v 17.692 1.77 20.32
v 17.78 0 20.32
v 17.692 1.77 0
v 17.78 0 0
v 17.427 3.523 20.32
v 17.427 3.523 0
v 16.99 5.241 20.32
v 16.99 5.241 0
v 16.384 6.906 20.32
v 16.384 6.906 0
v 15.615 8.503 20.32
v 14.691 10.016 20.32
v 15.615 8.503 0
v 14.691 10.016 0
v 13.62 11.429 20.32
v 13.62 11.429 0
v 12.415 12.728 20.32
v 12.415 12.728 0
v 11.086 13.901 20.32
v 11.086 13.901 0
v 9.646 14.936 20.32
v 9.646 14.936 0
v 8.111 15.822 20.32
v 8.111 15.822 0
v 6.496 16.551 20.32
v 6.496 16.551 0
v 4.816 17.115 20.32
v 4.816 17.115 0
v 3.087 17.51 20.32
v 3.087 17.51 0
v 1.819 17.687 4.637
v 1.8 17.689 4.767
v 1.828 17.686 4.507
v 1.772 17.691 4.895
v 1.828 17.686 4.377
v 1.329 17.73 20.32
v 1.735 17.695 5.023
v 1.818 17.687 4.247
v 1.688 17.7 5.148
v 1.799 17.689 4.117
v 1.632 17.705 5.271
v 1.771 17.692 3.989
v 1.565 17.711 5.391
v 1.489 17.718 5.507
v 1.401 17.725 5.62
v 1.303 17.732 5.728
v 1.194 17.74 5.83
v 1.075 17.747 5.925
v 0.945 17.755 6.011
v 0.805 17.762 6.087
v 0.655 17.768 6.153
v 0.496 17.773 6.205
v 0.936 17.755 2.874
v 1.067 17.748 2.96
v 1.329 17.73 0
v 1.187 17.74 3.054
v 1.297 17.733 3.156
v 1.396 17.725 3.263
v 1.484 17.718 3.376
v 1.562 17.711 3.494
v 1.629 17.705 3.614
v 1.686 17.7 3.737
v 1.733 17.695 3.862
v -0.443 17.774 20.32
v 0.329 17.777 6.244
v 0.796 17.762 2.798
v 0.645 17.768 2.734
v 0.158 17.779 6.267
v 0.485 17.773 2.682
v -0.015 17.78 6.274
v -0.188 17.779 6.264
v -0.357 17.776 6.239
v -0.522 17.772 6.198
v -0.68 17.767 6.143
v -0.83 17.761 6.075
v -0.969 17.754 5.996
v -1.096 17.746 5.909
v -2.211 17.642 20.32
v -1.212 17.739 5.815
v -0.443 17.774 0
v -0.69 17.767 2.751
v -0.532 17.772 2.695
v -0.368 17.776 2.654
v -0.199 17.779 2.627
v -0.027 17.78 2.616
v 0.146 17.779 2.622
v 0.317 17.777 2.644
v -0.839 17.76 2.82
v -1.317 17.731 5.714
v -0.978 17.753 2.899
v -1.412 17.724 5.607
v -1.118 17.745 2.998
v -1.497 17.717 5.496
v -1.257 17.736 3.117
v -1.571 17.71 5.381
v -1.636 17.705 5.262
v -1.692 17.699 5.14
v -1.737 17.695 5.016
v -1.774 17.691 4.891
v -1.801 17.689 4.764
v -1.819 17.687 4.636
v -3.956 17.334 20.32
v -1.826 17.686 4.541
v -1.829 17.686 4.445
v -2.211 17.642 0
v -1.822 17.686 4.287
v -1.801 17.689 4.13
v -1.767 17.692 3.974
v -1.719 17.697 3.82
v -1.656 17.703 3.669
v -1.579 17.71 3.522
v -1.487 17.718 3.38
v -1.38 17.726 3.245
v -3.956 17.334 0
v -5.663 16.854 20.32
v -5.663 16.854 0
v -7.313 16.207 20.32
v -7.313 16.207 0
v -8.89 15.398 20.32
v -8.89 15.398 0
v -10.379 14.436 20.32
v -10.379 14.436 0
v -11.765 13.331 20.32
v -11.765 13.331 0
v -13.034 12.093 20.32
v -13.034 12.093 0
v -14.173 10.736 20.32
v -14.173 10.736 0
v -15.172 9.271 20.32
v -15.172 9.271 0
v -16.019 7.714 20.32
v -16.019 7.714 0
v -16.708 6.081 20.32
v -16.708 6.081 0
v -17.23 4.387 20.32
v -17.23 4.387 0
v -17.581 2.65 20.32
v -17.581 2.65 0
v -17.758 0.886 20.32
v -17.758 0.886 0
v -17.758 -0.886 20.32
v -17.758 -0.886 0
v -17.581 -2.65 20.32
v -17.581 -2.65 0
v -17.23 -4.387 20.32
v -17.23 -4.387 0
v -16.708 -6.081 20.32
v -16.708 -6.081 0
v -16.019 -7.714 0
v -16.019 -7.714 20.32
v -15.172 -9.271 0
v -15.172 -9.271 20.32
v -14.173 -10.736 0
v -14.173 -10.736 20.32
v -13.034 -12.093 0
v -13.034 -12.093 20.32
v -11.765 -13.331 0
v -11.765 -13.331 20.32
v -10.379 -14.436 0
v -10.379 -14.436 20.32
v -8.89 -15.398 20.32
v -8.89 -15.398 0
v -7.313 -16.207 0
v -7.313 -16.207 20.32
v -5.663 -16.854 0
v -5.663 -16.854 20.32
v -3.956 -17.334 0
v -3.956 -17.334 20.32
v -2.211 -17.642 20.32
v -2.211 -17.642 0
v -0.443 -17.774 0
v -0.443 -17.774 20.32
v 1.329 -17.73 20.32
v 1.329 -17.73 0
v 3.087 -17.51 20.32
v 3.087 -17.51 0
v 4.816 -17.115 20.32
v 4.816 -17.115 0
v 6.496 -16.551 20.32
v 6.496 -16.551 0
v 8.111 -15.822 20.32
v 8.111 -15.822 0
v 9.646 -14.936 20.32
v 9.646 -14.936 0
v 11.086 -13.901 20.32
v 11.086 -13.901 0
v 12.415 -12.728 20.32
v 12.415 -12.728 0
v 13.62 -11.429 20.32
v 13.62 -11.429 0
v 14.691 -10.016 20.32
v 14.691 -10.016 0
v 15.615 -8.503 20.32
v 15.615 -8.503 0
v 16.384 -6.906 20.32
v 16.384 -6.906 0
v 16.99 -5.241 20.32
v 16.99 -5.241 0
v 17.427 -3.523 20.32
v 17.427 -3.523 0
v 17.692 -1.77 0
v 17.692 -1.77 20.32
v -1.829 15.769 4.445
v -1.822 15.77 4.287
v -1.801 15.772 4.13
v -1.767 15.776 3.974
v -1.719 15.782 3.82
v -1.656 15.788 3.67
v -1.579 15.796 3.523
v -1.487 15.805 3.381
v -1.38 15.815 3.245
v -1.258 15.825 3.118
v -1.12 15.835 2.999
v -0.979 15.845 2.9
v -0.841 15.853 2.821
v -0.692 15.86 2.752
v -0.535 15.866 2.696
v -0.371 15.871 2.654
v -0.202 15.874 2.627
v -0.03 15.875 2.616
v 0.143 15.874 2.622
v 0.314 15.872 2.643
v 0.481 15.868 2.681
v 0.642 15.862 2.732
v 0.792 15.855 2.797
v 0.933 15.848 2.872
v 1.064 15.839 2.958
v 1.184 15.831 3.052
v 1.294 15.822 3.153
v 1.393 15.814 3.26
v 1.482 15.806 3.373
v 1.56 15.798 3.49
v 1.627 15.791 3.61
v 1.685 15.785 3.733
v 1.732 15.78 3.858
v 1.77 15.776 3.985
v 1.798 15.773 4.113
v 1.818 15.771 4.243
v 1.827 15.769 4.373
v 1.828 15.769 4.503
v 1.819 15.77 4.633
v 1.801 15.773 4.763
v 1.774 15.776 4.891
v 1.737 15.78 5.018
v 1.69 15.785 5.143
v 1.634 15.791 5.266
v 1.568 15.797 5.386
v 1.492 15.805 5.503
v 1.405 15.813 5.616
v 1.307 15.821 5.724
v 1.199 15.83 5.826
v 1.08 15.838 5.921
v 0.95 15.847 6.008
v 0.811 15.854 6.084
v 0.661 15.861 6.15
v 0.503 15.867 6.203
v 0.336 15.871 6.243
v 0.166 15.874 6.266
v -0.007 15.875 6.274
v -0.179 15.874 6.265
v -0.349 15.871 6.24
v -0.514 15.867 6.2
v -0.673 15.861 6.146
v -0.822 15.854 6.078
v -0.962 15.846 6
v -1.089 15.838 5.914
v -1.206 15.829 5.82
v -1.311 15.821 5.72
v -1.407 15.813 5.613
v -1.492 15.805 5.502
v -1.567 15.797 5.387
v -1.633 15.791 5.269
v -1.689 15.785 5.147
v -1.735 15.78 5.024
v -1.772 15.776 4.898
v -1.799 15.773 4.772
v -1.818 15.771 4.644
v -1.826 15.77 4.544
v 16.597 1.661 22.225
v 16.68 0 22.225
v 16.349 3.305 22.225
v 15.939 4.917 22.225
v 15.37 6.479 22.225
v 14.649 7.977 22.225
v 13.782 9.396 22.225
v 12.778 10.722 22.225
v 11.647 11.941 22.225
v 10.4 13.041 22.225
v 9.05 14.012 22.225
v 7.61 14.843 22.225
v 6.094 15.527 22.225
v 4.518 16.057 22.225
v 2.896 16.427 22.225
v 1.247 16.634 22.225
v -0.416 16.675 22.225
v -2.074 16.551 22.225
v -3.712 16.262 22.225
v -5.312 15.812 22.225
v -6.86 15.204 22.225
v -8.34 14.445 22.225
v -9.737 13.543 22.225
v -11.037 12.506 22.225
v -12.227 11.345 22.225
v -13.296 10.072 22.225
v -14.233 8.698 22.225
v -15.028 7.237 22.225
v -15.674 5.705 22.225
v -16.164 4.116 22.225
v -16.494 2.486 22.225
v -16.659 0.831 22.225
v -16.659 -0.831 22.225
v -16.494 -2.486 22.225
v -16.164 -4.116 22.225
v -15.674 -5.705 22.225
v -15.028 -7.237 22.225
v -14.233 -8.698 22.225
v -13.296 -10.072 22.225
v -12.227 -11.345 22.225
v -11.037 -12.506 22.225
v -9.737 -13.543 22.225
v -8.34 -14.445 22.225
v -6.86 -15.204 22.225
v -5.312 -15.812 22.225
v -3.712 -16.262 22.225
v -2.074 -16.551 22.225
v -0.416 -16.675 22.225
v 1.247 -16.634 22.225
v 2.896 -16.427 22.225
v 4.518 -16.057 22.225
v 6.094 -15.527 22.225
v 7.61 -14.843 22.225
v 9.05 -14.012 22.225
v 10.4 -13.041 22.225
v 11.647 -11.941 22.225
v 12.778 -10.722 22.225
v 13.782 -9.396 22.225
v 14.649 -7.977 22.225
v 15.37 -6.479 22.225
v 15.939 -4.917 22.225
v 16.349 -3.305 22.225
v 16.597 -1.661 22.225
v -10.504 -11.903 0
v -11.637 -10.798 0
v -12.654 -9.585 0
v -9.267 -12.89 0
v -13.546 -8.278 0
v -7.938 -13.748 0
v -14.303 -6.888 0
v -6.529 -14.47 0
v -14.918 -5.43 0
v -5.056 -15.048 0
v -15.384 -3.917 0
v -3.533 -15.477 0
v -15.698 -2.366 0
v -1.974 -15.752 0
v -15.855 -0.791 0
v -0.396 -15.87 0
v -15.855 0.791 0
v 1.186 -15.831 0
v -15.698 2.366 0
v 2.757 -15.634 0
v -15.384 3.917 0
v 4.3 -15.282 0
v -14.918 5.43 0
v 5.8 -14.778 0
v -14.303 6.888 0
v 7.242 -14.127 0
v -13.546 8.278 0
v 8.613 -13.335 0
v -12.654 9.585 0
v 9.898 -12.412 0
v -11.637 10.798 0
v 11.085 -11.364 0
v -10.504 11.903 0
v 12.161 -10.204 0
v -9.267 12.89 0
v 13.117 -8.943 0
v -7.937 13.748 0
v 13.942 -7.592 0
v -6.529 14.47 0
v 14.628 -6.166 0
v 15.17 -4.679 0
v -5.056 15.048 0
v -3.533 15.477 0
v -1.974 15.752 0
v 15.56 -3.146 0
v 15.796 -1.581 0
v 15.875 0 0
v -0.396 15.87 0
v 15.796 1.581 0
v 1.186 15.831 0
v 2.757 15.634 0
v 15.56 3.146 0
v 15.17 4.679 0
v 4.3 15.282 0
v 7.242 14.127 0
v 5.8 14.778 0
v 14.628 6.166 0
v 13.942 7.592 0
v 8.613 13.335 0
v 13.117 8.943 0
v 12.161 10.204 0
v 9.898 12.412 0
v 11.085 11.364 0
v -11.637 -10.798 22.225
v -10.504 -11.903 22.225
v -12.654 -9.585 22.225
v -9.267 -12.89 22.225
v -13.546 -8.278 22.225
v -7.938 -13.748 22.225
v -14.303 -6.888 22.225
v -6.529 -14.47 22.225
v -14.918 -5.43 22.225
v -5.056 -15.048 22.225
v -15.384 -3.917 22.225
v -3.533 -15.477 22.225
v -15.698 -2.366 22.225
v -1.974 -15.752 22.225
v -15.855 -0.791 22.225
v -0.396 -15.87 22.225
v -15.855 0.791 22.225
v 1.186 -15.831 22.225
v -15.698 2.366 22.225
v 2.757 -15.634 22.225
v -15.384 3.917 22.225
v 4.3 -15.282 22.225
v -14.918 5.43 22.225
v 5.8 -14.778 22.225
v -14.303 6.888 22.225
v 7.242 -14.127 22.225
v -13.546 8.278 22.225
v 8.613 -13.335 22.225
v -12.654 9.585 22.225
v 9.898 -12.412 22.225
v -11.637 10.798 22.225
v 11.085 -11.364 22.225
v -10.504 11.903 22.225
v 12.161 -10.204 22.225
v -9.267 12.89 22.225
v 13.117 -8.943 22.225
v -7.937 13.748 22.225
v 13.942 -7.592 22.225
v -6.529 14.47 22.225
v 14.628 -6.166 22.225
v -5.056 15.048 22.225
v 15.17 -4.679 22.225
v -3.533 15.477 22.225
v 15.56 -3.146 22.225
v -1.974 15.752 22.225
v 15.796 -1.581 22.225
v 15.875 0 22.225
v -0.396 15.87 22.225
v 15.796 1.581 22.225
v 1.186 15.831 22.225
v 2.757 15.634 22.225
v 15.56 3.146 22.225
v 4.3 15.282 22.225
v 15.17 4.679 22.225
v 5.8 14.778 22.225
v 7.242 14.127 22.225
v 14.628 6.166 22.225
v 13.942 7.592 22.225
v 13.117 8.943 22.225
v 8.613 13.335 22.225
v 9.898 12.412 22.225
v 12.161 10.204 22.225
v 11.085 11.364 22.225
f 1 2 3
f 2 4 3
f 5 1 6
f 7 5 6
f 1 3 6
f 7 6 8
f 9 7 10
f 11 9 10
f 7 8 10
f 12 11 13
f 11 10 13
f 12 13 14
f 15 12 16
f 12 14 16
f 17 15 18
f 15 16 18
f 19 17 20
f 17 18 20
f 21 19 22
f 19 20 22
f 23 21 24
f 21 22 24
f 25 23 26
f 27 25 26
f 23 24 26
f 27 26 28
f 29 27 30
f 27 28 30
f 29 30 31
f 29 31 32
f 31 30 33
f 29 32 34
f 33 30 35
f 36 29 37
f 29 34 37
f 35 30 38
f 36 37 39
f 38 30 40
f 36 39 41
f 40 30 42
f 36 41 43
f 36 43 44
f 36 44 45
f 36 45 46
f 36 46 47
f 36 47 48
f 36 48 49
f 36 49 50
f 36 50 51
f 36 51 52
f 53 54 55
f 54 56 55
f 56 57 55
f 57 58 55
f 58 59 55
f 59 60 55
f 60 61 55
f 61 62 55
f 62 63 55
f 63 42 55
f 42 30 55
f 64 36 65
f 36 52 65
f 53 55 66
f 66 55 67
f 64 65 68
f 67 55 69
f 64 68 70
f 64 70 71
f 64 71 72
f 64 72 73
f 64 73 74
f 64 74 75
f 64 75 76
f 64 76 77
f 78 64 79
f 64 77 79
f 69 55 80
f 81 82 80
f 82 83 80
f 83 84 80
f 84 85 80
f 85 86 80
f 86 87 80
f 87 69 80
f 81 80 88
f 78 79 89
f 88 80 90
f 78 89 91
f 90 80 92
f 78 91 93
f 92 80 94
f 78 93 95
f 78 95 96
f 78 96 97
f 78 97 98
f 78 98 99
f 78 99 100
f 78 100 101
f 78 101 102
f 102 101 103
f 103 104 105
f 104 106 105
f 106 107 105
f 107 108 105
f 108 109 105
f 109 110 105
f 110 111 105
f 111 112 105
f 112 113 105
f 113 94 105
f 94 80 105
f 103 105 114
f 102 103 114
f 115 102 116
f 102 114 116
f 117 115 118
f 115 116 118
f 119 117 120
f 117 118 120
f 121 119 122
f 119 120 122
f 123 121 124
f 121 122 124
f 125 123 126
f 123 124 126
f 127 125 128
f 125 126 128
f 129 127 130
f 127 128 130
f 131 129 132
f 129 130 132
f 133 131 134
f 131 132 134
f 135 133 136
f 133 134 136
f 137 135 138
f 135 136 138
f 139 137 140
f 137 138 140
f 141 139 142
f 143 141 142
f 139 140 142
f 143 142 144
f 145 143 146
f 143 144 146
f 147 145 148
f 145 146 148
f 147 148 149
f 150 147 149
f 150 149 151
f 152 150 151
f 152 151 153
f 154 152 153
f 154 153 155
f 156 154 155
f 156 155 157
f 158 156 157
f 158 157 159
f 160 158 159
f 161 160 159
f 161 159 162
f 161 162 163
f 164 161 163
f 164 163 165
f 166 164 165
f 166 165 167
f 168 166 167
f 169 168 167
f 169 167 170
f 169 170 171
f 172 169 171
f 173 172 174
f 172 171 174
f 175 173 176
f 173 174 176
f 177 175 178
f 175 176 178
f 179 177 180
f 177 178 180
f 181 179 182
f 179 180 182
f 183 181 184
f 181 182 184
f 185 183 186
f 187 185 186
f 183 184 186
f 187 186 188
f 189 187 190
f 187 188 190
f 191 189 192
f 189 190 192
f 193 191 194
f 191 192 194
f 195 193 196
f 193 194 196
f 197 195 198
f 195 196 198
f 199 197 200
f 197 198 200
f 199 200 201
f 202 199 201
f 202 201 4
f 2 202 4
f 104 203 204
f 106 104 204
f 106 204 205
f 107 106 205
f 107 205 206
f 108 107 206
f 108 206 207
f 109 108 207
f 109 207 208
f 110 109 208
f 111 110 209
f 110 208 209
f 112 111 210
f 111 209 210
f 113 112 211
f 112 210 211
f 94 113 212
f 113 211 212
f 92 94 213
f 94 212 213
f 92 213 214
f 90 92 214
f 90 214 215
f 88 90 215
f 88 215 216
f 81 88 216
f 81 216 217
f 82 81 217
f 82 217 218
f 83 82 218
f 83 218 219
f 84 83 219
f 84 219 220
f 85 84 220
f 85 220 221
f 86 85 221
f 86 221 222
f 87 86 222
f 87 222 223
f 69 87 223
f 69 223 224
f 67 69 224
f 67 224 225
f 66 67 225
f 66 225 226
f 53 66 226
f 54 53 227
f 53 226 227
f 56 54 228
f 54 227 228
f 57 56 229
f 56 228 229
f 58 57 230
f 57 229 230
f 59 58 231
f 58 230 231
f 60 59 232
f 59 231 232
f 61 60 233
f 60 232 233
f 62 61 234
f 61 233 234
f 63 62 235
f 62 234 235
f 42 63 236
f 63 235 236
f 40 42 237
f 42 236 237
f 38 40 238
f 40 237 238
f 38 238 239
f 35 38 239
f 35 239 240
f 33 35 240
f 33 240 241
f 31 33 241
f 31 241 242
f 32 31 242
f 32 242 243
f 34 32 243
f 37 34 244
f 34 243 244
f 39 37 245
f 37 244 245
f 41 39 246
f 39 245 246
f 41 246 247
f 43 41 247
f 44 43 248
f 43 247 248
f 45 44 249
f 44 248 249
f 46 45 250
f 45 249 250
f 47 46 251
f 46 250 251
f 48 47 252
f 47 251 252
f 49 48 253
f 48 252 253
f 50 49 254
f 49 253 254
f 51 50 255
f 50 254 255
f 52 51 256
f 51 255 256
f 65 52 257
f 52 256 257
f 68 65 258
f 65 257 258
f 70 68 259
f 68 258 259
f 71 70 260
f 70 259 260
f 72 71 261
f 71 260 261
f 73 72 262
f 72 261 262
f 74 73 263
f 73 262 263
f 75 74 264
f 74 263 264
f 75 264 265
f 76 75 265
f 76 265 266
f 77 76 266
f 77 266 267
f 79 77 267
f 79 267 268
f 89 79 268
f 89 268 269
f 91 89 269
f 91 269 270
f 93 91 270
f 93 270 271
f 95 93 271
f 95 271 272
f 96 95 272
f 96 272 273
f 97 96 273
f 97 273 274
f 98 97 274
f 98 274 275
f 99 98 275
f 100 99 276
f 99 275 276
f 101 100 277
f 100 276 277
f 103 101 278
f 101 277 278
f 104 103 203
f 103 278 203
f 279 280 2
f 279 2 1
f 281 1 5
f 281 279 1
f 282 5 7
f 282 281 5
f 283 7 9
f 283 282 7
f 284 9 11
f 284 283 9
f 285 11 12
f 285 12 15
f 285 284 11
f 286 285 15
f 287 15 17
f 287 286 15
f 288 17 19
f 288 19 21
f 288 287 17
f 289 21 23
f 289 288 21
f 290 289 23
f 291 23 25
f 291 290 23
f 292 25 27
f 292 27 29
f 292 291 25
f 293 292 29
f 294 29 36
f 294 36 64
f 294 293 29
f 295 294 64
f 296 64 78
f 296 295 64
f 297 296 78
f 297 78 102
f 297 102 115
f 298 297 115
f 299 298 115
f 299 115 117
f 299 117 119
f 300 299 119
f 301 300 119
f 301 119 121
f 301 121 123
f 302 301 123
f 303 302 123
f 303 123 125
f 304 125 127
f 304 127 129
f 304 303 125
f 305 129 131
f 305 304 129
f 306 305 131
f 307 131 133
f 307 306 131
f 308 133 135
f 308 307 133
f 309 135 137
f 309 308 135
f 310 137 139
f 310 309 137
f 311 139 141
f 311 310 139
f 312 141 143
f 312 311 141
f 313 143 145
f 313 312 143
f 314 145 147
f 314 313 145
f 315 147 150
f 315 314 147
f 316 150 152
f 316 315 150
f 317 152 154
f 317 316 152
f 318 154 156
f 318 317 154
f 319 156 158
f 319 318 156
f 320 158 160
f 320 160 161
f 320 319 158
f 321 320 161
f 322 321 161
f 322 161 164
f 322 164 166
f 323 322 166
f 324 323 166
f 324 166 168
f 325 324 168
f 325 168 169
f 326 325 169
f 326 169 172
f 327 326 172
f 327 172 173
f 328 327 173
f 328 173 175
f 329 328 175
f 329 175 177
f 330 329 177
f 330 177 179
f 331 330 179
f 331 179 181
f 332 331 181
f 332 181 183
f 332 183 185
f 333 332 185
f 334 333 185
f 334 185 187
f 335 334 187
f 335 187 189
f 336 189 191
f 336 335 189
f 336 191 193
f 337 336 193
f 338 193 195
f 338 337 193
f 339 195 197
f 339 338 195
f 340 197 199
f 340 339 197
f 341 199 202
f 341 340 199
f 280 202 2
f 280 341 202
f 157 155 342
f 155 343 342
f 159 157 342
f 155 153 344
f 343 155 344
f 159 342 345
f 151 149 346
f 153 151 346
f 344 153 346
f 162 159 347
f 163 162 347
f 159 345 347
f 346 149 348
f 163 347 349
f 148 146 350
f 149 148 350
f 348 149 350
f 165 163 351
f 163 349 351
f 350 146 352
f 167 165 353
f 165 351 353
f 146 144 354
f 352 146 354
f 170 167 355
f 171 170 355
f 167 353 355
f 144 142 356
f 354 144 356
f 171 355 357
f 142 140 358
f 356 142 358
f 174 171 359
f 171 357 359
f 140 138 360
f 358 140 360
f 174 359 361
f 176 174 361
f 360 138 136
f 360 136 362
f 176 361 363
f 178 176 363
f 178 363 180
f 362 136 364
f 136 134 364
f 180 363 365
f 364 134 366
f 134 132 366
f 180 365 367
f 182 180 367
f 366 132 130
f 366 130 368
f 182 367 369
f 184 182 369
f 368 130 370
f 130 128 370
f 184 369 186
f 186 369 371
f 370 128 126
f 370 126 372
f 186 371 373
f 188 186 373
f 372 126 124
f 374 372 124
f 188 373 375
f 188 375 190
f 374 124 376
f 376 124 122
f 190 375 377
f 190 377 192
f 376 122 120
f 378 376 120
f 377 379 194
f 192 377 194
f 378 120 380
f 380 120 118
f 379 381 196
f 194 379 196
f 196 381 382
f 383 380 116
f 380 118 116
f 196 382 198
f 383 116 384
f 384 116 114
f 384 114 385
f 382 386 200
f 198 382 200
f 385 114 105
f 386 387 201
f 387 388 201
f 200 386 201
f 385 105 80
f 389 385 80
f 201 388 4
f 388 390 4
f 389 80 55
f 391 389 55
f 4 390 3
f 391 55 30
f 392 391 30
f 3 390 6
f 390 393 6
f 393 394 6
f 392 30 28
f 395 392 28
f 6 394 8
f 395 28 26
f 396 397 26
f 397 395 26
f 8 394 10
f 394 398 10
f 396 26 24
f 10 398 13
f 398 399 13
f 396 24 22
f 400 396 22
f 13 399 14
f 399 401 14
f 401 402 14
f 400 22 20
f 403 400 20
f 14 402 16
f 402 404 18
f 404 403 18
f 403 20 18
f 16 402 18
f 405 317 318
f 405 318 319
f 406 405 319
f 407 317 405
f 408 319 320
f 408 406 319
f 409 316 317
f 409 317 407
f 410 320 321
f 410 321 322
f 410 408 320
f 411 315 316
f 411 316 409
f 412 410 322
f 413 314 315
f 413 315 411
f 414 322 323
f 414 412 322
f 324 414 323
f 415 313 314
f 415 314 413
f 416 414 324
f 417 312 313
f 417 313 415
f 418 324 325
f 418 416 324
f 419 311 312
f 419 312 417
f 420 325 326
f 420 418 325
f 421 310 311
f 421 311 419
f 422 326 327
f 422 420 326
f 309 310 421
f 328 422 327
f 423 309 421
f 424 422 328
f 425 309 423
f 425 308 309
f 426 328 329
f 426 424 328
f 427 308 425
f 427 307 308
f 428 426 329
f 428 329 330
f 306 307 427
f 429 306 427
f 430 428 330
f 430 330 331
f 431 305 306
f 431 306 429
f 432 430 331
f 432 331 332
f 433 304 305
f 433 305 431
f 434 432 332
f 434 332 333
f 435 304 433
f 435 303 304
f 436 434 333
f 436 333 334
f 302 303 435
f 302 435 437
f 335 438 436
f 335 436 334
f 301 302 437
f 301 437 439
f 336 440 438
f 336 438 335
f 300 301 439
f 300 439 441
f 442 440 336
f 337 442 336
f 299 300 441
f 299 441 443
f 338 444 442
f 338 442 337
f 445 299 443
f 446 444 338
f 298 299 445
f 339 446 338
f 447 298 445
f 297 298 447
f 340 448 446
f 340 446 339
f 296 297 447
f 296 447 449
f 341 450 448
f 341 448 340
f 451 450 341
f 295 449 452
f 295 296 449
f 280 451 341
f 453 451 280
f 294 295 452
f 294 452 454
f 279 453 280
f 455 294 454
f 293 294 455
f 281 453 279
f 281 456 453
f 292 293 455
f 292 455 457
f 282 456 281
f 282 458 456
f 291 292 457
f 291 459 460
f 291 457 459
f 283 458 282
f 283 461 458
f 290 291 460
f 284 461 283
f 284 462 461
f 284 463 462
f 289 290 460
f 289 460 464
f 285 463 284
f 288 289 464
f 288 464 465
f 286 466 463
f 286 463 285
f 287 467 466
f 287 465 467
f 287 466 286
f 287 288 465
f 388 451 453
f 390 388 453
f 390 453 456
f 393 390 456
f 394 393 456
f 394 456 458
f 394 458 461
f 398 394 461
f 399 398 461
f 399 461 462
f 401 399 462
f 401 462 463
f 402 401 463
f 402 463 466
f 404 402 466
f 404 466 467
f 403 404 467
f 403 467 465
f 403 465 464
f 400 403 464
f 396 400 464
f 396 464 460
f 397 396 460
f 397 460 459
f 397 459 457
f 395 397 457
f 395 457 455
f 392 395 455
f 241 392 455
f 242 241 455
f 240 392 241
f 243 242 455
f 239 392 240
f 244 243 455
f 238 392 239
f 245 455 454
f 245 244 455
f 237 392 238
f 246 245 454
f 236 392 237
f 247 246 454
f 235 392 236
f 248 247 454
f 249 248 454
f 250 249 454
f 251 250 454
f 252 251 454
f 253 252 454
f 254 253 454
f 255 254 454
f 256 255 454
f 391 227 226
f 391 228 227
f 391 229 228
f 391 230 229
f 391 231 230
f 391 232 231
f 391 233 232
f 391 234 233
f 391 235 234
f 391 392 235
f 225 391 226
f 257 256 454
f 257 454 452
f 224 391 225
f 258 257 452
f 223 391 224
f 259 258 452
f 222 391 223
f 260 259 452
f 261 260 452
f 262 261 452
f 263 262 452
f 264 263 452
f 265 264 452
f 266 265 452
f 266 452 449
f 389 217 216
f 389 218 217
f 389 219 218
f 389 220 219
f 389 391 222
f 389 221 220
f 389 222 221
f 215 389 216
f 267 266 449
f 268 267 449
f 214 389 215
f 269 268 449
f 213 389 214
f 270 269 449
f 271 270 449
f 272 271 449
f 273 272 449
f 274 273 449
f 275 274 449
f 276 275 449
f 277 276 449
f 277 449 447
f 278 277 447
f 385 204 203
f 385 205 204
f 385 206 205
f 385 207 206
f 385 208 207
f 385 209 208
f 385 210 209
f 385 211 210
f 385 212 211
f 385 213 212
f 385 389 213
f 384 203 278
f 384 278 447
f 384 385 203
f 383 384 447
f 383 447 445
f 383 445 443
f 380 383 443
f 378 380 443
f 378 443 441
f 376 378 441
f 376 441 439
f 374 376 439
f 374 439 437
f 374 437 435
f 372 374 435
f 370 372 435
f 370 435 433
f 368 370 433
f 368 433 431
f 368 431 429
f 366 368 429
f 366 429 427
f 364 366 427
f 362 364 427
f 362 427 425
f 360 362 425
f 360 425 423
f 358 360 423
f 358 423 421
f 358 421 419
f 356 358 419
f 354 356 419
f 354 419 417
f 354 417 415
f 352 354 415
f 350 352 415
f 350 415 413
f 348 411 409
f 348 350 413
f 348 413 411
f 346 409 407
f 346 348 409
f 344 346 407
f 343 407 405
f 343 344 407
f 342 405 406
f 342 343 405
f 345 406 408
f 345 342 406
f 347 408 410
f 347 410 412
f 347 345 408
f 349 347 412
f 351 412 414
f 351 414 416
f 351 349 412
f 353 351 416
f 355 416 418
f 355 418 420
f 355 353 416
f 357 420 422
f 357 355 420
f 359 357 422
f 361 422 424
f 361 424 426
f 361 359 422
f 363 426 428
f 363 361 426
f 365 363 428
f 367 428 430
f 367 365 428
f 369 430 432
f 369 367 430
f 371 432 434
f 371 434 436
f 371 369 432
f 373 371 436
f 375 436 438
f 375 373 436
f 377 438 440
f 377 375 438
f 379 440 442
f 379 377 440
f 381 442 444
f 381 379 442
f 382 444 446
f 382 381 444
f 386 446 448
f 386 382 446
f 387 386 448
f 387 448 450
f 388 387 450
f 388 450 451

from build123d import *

# Parameters (mm, degrees)
SKETCH1_R                       = 17.78
SKETCH1_R_2                     = 15.875
BOSS_EXTRUDE1_DEPTH             = 22.225
CHAMFER4_SIZE                   = 1.905
CHAMFER4_SIZE2                  = 1.099852263
F_27_0_144_DIAMETER_HOLE1_D     = 3.6576
F_27_0_144_DIAMETER_HOLE1_DEPTH = 25.4
F_27_0_144_DIAMETER_HOLE1_TIP   = 1.0988539


with BuildPart() as part:
    # Sketch1 → Boss-Extrude1 (new body)
    with BuildSketch(Plane.XY):
        Circle(SKETCH1_R)
        Circle(SKETCH1_R_2, mode=Mode.SUBTRACT)
    extrude(amount=BOSS_EXTRUDE1_DEPTH)

    # Chamfer4
    chamfer4_edges = [part.edges().sort_by_distance(p)[0] for p in [
        (-17.78, 0, 22.225),
    ]]
    chamfer4_side = [part.faces().sort_by_distance(p)[0] for p in [
        (-17.78, 0, 11.1125),
    ]]
    chamfer(chamfer4_edges, length=CHAMFER4_SIZE, length2=CHAMFER4_SIZE2, reference=chamfer4_side[0])

    # #27 (0.144) Diameter Hole1
    with Locations(Plane(origin=(0, 17.78, 4.445), x_dir=(1, 0, 0), z_dir=(0, 1, 0))):
        with Locations((0, 0)):
            Hole(F_27_0_144_DIAMETER_HOLE1_D / 2, depth=F_27_0_144_DIAMETER_HOLE1_DEPTH)
            with Locations((0, 0, -(F_27_0_144_DIAMETER_HOLE1_DEPTH + F_27_0_144_DIAMETER_HOLE1_TIP / 2))):  # 118° drill point
                Cone(0, F_27_0_144_DIAMETER_HOLE1_D / 2, F_27_0_144_DIAMETER_HOLE1_TIP, mode=Mode.SUBTRACT)


solid = part.part
